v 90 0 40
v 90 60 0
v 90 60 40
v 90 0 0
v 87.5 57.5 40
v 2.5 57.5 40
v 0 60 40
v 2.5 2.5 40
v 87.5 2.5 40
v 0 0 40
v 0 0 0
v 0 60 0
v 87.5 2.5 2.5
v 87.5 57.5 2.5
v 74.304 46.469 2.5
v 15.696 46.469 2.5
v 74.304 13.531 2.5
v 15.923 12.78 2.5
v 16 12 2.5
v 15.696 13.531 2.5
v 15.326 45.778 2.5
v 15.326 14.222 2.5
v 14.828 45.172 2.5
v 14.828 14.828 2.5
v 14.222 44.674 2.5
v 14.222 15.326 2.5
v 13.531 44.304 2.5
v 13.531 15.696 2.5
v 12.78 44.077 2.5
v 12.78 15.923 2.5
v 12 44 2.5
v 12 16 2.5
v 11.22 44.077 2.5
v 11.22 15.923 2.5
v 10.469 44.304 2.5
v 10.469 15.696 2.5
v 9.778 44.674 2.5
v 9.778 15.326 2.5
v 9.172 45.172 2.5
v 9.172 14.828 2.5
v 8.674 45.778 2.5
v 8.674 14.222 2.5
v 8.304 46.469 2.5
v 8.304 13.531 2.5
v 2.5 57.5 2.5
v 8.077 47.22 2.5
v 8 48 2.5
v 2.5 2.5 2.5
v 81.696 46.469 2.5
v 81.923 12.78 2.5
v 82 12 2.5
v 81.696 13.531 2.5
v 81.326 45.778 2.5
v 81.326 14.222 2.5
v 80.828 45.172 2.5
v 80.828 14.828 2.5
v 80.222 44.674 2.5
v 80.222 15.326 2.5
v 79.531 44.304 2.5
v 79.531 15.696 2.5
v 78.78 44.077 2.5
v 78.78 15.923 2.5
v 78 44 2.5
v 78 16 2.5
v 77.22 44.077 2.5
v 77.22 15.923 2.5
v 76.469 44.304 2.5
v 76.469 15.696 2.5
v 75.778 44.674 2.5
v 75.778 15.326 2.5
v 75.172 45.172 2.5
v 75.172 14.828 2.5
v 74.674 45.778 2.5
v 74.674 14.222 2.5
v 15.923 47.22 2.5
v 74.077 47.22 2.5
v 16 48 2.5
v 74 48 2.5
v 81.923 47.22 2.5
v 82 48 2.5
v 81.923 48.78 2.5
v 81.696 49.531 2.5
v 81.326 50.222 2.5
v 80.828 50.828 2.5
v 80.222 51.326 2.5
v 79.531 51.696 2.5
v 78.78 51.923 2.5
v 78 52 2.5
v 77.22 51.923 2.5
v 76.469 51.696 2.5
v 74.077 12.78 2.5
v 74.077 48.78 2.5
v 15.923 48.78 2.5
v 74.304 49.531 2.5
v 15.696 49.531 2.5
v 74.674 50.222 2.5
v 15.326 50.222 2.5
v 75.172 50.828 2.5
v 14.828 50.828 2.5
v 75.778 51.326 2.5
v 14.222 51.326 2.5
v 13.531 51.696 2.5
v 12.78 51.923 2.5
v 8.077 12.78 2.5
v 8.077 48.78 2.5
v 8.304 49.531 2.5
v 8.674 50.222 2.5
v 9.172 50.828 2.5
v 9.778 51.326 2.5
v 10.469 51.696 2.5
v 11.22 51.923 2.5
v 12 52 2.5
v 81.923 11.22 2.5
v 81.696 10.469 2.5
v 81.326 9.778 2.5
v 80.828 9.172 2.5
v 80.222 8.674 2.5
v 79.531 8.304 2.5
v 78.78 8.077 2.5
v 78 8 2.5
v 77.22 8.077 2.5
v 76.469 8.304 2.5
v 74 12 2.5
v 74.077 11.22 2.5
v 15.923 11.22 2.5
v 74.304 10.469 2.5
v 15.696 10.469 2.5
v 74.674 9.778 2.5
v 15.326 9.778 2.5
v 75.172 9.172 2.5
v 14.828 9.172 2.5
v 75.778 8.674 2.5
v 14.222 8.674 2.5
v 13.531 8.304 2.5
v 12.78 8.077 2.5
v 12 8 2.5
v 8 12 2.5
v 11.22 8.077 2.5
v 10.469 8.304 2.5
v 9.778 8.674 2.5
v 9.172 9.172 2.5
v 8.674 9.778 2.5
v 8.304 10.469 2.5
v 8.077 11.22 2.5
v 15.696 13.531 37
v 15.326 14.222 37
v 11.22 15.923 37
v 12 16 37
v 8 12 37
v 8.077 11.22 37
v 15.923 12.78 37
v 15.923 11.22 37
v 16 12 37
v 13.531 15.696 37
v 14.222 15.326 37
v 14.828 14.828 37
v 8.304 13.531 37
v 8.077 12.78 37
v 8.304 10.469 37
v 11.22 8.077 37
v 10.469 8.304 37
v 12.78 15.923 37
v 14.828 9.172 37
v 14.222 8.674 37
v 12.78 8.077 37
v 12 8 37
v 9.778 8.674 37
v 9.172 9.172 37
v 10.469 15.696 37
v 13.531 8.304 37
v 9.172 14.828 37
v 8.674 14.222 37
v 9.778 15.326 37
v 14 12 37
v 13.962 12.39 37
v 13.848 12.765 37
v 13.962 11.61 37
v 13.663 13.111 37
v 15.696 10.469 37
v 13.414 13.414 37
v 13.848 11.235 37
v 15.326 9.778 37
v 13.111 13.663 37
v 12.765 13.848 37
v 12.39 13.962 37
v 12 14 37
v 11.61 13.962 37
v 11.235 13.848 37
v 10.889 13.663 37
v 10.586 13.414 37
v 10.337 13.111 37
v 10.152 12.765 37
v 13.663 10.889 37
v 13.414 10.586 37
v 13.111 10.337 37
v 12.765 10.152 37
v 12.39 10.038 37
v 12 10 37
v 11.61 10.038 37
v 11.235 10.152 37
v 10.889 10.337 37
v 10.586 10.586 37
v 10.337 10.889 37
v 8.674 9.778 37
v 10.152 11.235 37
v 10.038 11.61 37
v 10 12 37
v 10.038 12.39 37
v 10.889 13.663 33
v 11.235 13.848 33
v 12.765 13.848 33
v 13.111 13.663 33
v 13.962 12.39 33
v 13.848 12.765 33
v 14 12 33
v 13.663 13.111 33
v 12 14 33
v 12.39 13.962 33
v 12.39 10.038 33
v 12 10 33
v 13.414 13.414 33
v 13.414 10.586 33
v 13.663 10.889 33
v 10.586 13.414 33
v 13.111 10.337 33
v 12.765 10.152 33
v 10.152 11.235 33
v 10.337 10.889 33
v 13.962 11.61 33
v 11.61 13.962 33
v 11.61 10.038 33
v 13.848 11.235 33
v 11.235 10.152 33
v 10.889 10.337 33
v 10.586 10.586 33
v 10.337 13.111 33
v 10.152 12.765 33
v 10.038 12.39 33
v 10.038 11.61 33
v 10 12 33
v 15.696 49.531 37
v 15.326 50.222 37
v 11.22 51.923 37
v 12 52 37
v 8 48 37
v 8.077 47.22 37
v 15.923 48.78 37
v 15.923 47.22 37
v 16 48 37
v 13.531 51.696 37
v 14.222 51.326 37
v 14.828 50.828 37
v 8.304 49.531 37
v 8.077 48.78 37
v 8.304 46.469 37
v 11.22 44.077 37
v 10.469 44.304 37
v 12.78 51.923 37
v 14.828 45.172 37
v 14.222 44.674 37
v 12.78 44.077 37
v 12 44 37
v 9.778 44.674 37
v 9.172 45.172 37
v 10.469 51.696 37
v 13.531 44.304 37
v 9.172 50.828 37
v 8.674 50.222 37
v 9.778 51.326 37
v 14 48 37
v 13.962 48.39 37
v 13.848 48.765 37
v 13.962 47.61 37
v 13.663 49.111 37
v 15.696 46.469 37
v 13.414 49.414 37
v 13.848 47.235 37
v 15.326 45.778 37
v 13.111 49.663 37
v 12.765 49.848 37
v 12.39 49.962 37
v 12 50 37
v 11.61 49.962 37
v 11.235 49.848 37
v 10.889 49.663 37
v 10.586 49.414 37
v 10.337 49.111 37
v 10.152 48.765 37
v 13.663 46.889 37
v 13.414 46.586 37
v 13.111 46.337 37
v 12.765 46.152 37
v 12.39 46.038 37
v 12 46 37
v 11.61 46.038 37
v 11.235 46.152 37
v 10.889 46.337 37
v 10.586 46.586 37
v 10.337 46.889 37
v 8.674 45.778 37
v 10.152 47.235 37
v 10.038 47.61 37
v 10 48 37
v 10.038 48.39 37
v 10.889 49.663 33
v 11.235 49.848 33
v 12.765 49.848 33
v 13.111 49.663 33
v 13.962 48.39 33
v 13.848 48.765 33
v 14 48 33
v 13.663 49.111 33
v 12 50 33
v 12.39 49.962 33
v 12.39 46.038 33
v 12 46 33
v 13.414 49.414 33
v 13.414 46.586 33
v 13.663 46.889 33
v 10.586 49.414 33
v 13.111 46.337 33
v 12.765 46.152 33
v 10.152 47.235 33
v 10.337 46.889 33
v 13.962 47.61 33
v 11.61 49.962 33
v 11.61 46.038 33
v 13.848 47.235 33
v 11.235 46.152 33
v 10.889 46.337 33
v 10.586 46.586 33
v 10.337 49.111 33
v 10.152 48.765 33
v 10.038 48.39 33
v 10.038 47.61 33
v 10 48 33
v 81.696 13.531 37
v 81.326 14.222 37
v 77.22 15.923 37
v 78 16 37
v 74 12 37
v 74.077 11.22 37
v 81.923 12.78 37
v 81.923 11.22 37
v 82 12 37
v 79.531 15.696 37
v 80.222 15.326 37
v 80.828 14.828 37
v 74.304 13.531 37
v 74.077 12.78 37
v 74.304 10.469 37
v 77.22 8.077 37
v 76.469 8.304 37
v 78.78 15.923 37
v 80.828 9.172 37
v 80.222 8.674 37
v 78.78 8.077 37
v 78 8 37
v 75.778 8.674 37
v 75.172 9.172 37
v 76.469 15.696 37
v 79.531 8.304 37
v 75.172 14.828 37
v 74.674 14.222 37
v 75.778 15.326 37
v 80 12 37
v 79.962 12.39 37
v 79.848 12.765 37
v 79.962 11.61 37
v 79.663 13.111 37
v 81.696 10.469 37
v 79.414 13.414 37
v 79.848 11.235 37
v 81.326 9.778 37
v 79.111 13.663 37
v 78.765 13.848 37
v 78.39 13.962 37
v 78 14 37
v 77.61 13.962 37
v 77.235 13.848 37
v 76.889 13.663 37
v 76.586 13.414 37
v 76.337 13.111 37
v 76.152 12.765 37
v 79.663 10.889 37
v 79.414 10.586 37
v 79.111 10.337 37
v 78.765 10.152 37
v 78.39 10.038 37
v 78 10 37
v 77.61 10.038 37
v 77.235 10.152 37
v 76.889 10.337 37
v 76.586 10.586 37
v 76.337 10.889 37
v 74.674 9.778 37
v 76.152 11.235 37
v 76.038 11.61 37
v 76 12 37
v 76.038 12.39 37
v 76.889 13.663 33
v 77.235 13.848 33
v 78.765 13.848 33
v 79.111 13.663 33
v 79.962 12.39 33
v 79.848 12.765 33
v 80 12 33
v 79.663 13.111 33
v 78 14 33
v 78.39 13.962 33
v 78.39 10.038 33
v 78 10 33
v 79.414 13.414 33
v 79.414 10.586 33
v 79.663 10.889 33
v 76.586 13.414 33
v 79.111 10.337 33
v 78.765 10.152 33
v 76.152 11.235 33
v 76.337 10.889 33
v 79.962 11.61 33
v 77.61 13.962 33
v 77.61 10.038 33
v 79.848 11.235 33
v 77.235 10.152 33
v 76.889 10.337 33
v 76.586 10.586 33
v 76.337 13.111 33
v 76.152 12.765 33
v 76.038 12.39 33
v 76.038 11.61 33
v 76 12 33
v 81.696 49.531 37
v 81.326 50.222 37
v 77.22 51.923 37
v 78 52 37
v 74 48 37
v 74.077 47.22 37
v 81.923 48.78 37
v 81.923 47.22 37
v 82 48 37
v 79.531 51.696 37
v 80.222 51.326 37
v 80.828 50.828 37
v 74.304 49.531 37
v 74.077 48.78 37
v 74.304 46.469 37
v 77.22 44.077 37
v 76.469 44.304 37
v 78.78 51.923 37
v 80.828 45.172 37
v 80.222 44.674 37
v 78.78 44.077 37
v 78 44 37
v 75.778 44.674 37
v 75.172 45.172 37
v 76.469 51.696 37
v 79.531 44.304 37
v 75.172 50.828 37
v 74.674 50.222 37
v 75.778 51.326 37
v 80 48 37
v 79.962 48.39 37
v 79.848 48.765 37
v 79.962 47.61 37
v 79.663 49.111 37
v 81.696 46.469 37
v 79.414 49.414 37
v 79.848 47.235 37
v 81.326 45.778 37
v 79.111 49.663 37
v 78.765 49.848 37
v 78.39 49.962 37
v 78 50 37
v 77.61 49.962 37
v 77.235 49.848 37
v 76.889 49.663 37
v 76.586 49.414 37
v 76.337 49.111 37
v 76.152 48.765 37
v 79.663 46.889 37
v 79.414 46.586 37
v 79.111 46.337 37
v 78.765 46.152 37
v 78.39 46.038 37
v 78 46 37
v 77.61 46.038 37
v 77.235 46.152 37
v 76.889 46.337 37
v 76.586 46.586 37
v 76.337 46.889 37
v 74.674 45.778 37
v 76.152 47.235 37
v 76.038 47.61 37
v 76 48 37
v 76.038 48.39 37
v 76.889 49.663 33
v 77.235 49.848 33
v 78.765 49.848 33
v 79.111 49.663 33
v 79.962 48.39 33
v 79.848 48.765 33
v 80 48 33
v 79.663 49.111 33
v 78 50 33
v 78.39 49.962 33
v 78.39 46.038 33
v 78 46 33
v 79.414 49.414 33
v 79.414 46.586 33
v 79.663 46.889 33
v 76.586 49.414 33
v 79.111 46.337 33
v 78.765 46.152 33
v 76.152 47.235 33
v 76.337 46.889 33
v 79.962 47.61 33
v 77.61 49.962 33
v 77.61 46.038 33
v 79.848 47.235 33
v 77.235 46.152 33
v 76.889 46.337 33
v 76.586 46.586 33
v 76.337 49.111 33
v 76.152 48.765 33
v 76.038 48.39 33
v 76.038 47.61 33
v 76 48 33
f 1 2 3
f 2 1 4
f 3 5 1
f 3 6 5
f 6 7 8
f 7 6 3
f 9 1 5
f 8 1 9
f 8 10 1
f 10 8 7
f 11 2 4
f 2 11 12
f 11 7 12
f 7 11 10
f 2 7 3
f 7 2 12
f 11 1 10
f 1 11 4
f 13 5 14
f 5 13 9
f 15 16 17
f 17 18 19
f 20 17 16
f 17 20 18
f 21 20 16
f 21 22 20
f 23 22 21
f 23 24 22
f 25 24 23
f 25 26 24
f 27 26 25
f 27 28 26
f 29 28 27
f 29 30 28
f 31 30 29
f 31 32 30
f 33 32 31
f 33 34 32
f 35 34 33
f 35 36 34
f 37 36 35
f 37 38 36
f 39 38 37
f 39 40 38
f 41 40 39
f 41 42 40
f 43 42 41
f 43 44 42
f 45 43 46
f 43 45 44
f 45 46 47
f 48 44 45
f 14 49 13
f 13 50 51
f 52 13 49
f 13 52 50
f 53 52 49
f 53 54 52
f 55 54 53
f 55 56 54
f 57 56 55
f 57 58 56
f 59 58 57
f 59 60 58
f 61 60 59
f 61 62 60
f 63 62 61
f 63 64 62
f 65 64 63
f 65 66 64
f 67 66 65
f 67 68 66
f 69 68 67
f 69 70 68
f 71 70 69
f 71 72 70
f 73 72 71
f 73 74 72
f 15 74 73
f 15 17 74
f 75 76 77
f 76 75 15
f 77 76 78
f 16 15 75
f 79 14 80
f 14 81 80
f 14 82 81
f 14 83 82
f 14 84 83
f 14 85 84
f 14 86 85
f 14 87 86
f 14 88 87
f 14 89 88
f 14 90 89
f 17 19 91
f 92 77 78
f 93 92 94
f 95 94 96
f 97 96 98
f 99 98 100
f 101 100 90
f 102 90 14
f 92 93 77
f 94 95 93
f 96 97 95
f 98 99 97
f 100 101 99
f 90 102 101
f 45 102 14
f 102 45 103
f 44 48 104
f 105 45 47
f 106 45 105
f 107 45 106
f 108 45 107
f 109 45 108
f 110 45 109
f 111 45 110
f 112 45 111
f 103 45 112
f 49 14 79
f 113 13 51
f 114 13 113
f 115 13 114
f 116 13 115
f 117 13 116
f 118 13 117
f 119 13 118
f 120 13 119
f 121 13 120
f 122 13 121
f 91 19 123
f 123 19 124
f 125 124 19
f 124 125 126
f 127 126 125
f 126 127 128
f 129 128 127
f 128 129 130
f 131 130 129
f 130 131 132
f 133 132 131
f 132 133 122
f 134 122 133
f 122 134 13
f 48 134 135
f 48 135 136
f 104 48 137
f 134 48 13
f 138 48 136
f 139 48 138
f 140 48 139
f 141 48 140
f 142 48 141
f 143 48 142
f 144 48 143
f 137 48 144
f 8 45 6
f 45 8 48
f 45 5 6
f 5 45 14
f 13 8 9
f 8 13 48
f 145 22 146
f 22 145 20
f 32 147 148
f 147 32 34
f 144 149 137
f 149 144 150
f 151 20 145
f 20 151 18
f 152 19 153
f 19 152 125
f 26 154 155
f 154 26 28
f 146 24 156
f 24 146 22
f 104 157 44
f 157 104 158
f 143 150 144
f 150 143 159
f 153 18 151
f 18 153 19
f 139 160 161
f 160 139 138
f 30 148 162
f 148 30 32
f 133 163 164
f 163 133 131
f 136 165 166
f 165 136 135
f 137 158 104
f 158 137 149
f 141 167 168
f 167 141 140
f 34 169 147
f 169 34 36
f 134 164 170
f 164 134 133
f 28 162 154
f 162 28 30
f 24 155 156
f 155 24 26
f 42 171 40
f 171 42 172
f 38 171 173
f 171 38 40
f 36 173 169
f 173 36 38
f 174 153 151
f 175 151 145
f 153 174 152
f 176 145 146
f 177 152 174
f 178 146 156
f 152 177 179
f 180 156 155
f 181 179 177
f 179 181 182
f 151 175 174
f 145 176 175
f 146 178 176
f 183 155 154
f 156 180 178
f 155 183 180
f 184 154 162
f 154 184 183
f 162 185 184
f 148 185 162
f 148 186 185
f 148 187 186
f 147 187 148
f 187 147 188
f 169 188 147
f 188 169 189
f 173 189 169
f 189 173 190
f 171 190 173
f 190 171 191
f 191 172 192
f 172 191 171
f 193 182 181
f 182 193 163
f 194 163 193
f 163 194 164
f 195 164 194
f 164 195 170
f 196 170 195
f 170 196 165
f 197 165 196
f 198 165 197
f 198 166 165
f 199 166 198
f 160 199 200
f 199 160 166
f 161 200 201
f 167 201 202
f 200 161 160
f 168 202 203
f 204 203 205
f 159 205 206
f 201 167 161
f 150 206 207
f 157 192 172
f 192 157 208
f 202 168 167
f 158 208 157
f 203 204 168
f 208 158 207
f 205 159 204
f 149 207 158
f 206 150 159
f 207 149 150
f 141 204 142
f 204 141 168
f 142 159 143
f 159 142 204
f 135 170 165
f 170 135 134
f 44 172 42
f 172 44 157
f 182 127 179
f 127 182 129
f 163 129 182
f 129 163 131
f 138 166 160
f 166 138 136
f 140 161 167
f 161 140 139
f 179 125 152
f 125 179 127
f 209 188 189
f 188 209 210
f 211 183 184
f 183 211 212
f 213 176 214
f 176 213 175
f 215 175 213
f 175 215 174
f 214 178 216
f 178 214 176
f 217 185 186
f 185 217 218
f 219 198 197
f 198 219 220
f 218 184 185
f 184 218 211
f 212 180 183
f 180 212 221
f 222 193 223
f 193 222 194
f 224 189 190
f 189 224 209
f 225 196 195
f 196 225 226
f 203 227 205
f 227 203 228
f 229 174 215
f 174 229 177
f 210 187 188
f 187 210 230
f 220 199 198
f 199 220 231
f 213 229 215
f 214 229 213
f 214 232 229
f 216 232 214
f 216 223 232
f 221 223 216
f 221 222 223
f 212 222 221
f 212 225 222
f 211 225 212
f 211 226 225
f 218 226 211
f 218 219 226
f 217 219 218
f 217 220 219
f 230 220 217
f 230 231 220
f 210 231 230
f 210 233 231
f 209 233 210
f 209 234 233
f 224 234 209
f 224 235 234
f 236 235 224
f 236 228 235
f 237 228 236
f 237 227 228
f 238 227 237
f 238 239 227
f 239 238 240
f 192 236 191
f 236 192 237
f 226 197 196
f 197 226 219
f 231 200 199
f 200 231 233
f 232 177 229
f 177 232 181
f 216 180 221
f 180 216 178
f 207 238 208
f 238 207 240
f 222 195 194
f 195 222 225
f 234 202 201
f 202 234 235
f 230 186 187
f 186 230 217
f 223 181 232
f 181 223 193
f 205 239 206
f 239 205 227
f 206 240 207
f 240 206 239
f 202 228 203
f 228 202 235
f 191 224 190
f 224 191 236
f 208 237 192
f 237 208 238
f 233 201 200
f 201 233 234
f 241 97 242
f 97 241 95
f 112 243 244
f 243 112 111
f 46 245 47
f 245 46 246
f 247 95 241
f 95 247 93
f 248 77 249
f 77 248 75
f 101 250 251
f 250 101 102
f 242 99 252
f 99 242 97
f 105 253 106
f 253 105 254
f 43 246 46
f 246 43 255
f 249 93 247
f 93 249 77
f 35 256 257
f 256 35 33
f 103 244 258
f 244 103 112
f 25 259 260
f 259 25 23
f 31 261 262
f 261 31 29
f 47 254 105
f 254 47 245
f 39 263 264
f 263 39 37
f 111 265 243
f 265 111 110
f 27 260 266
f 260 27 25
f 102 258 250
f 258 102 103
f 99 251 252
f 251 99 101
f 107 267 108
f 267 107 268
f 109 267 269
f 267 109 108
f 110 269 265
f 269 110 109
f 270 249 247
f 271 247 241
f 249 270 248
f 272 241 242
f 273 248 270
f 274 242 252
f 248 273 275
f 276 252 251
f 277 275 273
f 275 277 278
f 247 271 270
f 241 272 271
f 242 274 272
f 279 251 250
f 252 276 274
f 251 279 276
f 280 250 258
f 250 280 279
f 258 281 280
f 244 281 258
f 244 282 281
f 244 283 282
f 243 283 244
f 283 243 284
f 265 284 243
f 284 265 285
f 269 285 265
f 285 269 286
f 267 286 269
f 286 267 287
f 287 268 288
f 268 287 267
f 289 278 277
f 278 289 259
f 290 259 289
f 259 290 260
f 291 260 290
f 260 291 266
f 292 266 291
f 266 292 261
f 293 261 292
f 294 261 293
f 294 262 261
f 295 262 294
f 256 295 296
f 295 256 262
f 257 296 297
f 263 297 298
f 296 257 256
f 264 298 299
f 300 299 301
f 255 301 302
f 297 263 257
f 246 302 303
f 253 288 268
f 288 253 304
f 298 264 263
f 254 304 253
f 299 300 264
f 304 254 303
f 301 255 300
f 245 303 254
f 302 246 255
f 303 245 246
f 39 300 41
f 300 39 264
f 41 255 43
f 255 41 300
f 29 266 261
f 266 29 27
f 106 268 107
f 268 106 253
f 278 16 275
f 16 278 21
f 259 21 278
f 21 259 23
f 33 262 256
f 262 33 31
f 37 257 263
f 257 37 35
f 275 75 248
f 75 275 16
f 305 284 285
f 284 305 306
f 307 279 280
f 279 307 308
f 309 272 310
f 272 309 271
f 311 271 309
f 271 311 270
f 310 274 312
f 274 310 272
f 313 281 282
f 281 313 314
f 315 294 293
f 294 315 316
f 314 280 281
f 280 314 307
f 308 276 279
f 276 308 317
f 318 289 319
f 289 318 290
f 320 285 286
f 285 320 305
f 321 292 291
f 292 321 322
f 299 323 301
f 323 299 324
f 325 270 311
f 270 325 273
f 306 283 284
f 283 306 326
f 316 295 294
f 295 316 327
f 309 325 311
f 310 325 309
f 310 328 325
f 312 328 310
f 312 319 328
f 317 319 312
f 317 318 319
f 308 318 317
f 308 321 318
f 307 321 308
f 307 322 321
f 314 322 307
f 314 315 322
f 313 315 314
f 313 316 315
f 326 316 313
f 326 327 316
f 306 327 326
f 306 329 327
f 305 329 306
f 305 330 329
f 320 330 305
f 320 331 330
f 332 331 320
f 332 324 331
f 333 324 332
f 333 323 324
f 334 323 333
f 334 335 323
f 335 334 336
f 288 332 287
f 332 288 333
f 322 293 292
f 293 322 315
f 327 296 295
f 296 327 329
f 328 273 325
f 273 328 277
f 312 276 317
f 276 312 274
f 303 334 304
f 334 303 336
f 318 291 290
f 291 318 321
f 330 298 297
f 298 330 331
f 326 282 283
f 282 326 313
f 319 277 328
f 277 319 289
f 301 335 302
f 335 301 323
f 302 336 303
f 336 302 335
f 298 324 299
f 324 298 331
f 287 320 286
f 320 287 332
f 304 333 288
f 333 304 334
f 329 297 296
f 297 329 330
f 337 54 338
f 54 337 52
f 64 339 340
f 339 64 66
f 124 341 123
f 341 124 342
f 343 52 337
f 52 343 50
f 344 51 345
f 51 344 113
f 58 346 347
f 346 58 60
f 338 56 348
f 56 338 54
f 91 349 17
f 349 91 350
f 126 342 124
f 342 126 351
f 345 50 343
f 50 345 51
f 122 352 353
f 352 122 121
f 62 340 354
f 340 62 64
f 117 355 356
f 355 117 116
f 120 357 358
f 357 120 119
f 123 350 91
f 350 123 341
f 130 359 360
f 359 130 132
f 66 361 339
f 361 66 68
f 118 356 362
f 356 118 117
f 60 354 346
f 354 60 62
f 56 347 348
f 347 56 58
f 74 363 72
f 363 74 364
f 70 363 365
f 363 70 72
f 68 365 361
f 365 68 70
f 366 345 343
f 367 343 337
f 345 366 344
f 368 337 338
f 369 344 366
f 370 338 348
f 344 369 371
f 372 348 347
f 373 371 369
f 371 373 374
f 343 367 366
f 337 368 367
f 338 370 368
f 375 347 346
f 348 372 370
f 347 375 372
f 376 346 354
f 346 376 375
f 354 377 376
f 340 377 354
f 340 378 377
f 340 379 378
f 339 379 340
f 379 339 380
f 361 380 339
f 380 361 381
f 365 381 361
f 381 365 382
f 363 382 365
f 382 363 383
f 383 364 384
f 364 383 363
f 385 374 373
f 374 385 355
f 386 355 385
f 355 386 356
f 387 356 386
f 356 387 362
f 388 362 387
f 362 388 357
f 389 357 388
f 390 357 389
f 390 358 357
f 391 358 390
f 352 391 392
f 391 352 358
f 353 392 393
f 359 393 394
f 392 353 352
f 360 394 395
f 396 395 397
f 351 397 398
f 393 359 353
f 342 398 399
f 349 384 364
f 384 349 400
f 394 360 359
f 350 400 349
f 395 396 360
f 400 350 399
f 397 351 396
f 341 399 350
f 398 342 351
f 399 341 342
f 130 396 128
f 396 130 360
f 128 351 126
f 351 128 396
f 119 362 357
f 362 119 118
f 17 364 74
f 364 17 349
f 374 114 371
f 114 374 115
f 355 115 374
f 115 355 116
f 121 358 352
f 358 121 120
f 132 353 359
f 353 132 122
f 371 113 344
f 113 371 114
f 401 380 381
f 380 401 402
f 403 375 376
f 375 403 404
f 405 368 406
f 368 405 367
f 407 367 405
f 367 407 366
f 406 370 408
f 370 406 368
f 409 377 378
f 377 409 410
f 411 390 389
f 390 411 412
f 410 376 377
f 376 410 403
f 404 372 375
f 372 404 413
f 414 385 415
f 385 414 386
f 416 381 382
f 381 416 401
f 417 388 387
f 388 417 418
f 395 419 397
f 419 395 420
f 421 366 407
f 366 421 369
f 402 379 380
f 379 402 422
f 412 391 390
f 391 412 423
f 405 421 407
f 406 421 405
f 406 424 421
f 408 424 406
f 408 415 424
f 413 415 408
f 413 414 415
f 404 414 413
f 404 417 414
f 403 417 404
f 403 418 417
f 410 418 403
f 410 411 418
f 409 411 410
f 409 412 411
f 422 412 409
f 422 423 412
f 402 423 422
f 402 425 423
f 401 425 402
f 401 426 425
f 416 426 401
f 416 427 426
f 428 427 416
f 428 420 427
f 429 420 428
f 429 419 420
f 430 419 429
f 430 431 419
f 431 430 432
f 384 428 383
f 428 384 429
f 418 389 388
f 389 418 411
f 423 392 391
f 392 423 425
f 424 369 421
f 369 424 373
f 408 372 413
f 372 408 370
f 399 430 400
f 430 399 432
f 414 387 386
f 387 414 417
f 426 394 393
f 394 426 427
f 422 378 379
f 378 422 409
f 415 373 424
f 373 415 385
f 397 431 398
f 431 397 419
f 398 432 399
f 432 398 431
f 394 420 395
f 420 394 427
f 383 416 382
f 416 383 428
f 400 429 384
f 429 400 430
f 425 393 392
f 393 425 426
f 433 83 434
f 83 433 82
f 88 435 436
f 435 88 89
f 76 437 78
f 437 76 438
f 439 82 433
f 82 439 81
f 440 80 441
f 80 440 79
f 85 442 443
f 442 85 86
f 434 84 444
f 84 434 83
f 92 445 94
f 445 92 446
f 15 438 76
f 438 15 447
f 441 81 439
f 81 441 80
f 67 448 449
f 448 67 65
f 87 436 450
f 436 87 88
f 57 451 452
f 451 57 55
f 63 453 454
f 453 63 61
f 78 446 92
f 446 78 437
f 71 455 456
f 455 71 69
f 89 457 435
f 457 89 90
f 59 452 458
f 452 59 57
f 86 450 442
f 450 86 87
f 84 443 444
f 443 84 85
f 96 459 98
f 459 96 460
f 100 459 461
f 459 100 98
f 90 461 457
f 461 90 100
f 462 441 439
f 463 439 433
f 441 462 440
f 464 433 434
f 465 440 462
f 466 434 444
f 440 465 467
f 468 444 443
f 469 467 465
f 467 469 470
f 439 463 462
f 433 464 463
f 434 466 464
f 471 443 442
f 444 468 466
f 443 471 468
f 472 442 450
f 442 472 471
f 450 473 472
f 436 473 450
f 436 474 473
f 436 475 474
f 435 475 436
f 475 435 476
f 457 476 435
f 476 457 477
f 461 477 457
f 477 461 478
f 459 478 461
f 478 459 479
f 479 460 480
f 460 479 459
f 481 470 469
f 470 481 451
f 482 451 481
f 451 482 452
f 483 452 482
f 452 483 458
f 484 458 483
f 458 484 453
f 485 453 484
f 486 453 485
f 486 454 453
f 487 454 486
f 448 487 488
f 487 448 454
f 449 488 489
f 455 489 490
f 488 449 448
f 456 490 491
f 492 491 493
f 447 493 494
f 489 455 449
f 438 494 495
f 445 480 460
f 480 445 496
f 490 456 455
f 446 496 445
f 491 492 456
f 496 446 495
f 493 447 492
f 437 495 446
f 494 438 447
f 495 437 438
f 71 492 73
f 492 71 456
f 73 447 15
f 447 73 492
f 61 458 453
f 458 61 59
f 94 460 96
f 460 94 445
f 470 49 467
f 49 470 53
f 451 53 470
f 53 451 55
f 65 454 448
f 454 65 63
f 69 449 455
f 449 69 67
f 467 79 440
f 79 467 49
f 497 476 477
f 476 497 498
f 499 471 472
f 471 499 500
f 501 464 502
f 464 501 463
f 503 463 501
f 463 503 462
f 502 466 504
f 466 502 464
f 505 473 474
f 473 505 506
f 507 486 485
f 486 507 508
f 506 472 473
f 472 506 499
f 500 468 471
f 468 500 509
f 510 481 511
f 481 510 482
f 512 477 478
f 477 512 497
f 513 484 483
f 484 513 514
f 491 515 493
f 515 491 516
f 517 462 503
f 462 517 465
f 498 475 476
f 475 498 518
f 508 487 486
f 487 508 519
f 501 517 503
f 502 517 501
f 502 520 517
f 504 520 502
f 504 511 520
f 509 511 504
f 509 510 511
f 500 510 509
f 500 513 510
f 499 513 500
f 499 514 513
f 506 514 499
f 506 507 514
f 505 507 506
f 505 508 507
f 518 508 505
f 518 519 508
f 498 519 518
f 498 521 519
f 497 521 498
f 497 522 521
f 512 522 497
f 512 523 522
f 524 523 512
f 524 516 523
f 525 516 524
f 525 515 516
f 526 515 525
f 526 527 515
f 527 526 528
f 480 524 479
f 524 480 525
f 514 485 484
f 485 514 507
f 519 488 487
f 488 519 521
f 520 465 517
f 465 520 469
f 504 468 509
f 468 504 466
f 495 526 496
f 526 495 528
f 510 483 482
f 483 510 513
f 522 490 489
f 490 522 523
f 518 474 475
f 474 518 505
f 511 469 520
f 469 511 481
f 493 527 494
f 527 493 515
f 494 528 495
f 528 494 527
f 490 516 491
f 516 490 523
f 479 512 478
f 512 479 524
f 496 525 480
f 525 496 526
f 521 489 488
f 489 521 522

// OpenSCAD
$fn = 32;

// ----------------------------------------------------------------------
// Enclosure box: bosses enclosure
// ----------------------------------------------------------------------

// --- parameters (mm) ---
box_l = 90;               // outer length, X
box_w = 60;               // outer width, Y
box_h = 40;               // outer height
wall_t = 2.5;             // wall thickness
boss_r = 4;               // corner boss radius
hole_r = 2;               // boss screw hole radius
boss_in = 12;             // boss inset from the corners

inner_h = box_h - wall_t;  // cavity depth
boss_h = inner_h - 2;  // corner boss height

difference() {
  union() {
    difference() {
      cube([box_l, box_w, box_h]);
      translate([wall_t, wall_t, wall_t])
        cube([box_l - 2 * wall_t, box_w - 2 * wall_t, box_h]);
    }
    for (sx = [0, 1], sy = [0, 1])
      translate([sx ? box_l - boss_in : boss_in,
                 sy ? box_w - boss_in : boss_in, wall_t - 1])
        difference() {
          cylinder(r = boss_r, h = boss_h);
          translate([0, 0, boss_h - 4])
            cylinder(r = hole_r, h = 5);
        }
  }
}
